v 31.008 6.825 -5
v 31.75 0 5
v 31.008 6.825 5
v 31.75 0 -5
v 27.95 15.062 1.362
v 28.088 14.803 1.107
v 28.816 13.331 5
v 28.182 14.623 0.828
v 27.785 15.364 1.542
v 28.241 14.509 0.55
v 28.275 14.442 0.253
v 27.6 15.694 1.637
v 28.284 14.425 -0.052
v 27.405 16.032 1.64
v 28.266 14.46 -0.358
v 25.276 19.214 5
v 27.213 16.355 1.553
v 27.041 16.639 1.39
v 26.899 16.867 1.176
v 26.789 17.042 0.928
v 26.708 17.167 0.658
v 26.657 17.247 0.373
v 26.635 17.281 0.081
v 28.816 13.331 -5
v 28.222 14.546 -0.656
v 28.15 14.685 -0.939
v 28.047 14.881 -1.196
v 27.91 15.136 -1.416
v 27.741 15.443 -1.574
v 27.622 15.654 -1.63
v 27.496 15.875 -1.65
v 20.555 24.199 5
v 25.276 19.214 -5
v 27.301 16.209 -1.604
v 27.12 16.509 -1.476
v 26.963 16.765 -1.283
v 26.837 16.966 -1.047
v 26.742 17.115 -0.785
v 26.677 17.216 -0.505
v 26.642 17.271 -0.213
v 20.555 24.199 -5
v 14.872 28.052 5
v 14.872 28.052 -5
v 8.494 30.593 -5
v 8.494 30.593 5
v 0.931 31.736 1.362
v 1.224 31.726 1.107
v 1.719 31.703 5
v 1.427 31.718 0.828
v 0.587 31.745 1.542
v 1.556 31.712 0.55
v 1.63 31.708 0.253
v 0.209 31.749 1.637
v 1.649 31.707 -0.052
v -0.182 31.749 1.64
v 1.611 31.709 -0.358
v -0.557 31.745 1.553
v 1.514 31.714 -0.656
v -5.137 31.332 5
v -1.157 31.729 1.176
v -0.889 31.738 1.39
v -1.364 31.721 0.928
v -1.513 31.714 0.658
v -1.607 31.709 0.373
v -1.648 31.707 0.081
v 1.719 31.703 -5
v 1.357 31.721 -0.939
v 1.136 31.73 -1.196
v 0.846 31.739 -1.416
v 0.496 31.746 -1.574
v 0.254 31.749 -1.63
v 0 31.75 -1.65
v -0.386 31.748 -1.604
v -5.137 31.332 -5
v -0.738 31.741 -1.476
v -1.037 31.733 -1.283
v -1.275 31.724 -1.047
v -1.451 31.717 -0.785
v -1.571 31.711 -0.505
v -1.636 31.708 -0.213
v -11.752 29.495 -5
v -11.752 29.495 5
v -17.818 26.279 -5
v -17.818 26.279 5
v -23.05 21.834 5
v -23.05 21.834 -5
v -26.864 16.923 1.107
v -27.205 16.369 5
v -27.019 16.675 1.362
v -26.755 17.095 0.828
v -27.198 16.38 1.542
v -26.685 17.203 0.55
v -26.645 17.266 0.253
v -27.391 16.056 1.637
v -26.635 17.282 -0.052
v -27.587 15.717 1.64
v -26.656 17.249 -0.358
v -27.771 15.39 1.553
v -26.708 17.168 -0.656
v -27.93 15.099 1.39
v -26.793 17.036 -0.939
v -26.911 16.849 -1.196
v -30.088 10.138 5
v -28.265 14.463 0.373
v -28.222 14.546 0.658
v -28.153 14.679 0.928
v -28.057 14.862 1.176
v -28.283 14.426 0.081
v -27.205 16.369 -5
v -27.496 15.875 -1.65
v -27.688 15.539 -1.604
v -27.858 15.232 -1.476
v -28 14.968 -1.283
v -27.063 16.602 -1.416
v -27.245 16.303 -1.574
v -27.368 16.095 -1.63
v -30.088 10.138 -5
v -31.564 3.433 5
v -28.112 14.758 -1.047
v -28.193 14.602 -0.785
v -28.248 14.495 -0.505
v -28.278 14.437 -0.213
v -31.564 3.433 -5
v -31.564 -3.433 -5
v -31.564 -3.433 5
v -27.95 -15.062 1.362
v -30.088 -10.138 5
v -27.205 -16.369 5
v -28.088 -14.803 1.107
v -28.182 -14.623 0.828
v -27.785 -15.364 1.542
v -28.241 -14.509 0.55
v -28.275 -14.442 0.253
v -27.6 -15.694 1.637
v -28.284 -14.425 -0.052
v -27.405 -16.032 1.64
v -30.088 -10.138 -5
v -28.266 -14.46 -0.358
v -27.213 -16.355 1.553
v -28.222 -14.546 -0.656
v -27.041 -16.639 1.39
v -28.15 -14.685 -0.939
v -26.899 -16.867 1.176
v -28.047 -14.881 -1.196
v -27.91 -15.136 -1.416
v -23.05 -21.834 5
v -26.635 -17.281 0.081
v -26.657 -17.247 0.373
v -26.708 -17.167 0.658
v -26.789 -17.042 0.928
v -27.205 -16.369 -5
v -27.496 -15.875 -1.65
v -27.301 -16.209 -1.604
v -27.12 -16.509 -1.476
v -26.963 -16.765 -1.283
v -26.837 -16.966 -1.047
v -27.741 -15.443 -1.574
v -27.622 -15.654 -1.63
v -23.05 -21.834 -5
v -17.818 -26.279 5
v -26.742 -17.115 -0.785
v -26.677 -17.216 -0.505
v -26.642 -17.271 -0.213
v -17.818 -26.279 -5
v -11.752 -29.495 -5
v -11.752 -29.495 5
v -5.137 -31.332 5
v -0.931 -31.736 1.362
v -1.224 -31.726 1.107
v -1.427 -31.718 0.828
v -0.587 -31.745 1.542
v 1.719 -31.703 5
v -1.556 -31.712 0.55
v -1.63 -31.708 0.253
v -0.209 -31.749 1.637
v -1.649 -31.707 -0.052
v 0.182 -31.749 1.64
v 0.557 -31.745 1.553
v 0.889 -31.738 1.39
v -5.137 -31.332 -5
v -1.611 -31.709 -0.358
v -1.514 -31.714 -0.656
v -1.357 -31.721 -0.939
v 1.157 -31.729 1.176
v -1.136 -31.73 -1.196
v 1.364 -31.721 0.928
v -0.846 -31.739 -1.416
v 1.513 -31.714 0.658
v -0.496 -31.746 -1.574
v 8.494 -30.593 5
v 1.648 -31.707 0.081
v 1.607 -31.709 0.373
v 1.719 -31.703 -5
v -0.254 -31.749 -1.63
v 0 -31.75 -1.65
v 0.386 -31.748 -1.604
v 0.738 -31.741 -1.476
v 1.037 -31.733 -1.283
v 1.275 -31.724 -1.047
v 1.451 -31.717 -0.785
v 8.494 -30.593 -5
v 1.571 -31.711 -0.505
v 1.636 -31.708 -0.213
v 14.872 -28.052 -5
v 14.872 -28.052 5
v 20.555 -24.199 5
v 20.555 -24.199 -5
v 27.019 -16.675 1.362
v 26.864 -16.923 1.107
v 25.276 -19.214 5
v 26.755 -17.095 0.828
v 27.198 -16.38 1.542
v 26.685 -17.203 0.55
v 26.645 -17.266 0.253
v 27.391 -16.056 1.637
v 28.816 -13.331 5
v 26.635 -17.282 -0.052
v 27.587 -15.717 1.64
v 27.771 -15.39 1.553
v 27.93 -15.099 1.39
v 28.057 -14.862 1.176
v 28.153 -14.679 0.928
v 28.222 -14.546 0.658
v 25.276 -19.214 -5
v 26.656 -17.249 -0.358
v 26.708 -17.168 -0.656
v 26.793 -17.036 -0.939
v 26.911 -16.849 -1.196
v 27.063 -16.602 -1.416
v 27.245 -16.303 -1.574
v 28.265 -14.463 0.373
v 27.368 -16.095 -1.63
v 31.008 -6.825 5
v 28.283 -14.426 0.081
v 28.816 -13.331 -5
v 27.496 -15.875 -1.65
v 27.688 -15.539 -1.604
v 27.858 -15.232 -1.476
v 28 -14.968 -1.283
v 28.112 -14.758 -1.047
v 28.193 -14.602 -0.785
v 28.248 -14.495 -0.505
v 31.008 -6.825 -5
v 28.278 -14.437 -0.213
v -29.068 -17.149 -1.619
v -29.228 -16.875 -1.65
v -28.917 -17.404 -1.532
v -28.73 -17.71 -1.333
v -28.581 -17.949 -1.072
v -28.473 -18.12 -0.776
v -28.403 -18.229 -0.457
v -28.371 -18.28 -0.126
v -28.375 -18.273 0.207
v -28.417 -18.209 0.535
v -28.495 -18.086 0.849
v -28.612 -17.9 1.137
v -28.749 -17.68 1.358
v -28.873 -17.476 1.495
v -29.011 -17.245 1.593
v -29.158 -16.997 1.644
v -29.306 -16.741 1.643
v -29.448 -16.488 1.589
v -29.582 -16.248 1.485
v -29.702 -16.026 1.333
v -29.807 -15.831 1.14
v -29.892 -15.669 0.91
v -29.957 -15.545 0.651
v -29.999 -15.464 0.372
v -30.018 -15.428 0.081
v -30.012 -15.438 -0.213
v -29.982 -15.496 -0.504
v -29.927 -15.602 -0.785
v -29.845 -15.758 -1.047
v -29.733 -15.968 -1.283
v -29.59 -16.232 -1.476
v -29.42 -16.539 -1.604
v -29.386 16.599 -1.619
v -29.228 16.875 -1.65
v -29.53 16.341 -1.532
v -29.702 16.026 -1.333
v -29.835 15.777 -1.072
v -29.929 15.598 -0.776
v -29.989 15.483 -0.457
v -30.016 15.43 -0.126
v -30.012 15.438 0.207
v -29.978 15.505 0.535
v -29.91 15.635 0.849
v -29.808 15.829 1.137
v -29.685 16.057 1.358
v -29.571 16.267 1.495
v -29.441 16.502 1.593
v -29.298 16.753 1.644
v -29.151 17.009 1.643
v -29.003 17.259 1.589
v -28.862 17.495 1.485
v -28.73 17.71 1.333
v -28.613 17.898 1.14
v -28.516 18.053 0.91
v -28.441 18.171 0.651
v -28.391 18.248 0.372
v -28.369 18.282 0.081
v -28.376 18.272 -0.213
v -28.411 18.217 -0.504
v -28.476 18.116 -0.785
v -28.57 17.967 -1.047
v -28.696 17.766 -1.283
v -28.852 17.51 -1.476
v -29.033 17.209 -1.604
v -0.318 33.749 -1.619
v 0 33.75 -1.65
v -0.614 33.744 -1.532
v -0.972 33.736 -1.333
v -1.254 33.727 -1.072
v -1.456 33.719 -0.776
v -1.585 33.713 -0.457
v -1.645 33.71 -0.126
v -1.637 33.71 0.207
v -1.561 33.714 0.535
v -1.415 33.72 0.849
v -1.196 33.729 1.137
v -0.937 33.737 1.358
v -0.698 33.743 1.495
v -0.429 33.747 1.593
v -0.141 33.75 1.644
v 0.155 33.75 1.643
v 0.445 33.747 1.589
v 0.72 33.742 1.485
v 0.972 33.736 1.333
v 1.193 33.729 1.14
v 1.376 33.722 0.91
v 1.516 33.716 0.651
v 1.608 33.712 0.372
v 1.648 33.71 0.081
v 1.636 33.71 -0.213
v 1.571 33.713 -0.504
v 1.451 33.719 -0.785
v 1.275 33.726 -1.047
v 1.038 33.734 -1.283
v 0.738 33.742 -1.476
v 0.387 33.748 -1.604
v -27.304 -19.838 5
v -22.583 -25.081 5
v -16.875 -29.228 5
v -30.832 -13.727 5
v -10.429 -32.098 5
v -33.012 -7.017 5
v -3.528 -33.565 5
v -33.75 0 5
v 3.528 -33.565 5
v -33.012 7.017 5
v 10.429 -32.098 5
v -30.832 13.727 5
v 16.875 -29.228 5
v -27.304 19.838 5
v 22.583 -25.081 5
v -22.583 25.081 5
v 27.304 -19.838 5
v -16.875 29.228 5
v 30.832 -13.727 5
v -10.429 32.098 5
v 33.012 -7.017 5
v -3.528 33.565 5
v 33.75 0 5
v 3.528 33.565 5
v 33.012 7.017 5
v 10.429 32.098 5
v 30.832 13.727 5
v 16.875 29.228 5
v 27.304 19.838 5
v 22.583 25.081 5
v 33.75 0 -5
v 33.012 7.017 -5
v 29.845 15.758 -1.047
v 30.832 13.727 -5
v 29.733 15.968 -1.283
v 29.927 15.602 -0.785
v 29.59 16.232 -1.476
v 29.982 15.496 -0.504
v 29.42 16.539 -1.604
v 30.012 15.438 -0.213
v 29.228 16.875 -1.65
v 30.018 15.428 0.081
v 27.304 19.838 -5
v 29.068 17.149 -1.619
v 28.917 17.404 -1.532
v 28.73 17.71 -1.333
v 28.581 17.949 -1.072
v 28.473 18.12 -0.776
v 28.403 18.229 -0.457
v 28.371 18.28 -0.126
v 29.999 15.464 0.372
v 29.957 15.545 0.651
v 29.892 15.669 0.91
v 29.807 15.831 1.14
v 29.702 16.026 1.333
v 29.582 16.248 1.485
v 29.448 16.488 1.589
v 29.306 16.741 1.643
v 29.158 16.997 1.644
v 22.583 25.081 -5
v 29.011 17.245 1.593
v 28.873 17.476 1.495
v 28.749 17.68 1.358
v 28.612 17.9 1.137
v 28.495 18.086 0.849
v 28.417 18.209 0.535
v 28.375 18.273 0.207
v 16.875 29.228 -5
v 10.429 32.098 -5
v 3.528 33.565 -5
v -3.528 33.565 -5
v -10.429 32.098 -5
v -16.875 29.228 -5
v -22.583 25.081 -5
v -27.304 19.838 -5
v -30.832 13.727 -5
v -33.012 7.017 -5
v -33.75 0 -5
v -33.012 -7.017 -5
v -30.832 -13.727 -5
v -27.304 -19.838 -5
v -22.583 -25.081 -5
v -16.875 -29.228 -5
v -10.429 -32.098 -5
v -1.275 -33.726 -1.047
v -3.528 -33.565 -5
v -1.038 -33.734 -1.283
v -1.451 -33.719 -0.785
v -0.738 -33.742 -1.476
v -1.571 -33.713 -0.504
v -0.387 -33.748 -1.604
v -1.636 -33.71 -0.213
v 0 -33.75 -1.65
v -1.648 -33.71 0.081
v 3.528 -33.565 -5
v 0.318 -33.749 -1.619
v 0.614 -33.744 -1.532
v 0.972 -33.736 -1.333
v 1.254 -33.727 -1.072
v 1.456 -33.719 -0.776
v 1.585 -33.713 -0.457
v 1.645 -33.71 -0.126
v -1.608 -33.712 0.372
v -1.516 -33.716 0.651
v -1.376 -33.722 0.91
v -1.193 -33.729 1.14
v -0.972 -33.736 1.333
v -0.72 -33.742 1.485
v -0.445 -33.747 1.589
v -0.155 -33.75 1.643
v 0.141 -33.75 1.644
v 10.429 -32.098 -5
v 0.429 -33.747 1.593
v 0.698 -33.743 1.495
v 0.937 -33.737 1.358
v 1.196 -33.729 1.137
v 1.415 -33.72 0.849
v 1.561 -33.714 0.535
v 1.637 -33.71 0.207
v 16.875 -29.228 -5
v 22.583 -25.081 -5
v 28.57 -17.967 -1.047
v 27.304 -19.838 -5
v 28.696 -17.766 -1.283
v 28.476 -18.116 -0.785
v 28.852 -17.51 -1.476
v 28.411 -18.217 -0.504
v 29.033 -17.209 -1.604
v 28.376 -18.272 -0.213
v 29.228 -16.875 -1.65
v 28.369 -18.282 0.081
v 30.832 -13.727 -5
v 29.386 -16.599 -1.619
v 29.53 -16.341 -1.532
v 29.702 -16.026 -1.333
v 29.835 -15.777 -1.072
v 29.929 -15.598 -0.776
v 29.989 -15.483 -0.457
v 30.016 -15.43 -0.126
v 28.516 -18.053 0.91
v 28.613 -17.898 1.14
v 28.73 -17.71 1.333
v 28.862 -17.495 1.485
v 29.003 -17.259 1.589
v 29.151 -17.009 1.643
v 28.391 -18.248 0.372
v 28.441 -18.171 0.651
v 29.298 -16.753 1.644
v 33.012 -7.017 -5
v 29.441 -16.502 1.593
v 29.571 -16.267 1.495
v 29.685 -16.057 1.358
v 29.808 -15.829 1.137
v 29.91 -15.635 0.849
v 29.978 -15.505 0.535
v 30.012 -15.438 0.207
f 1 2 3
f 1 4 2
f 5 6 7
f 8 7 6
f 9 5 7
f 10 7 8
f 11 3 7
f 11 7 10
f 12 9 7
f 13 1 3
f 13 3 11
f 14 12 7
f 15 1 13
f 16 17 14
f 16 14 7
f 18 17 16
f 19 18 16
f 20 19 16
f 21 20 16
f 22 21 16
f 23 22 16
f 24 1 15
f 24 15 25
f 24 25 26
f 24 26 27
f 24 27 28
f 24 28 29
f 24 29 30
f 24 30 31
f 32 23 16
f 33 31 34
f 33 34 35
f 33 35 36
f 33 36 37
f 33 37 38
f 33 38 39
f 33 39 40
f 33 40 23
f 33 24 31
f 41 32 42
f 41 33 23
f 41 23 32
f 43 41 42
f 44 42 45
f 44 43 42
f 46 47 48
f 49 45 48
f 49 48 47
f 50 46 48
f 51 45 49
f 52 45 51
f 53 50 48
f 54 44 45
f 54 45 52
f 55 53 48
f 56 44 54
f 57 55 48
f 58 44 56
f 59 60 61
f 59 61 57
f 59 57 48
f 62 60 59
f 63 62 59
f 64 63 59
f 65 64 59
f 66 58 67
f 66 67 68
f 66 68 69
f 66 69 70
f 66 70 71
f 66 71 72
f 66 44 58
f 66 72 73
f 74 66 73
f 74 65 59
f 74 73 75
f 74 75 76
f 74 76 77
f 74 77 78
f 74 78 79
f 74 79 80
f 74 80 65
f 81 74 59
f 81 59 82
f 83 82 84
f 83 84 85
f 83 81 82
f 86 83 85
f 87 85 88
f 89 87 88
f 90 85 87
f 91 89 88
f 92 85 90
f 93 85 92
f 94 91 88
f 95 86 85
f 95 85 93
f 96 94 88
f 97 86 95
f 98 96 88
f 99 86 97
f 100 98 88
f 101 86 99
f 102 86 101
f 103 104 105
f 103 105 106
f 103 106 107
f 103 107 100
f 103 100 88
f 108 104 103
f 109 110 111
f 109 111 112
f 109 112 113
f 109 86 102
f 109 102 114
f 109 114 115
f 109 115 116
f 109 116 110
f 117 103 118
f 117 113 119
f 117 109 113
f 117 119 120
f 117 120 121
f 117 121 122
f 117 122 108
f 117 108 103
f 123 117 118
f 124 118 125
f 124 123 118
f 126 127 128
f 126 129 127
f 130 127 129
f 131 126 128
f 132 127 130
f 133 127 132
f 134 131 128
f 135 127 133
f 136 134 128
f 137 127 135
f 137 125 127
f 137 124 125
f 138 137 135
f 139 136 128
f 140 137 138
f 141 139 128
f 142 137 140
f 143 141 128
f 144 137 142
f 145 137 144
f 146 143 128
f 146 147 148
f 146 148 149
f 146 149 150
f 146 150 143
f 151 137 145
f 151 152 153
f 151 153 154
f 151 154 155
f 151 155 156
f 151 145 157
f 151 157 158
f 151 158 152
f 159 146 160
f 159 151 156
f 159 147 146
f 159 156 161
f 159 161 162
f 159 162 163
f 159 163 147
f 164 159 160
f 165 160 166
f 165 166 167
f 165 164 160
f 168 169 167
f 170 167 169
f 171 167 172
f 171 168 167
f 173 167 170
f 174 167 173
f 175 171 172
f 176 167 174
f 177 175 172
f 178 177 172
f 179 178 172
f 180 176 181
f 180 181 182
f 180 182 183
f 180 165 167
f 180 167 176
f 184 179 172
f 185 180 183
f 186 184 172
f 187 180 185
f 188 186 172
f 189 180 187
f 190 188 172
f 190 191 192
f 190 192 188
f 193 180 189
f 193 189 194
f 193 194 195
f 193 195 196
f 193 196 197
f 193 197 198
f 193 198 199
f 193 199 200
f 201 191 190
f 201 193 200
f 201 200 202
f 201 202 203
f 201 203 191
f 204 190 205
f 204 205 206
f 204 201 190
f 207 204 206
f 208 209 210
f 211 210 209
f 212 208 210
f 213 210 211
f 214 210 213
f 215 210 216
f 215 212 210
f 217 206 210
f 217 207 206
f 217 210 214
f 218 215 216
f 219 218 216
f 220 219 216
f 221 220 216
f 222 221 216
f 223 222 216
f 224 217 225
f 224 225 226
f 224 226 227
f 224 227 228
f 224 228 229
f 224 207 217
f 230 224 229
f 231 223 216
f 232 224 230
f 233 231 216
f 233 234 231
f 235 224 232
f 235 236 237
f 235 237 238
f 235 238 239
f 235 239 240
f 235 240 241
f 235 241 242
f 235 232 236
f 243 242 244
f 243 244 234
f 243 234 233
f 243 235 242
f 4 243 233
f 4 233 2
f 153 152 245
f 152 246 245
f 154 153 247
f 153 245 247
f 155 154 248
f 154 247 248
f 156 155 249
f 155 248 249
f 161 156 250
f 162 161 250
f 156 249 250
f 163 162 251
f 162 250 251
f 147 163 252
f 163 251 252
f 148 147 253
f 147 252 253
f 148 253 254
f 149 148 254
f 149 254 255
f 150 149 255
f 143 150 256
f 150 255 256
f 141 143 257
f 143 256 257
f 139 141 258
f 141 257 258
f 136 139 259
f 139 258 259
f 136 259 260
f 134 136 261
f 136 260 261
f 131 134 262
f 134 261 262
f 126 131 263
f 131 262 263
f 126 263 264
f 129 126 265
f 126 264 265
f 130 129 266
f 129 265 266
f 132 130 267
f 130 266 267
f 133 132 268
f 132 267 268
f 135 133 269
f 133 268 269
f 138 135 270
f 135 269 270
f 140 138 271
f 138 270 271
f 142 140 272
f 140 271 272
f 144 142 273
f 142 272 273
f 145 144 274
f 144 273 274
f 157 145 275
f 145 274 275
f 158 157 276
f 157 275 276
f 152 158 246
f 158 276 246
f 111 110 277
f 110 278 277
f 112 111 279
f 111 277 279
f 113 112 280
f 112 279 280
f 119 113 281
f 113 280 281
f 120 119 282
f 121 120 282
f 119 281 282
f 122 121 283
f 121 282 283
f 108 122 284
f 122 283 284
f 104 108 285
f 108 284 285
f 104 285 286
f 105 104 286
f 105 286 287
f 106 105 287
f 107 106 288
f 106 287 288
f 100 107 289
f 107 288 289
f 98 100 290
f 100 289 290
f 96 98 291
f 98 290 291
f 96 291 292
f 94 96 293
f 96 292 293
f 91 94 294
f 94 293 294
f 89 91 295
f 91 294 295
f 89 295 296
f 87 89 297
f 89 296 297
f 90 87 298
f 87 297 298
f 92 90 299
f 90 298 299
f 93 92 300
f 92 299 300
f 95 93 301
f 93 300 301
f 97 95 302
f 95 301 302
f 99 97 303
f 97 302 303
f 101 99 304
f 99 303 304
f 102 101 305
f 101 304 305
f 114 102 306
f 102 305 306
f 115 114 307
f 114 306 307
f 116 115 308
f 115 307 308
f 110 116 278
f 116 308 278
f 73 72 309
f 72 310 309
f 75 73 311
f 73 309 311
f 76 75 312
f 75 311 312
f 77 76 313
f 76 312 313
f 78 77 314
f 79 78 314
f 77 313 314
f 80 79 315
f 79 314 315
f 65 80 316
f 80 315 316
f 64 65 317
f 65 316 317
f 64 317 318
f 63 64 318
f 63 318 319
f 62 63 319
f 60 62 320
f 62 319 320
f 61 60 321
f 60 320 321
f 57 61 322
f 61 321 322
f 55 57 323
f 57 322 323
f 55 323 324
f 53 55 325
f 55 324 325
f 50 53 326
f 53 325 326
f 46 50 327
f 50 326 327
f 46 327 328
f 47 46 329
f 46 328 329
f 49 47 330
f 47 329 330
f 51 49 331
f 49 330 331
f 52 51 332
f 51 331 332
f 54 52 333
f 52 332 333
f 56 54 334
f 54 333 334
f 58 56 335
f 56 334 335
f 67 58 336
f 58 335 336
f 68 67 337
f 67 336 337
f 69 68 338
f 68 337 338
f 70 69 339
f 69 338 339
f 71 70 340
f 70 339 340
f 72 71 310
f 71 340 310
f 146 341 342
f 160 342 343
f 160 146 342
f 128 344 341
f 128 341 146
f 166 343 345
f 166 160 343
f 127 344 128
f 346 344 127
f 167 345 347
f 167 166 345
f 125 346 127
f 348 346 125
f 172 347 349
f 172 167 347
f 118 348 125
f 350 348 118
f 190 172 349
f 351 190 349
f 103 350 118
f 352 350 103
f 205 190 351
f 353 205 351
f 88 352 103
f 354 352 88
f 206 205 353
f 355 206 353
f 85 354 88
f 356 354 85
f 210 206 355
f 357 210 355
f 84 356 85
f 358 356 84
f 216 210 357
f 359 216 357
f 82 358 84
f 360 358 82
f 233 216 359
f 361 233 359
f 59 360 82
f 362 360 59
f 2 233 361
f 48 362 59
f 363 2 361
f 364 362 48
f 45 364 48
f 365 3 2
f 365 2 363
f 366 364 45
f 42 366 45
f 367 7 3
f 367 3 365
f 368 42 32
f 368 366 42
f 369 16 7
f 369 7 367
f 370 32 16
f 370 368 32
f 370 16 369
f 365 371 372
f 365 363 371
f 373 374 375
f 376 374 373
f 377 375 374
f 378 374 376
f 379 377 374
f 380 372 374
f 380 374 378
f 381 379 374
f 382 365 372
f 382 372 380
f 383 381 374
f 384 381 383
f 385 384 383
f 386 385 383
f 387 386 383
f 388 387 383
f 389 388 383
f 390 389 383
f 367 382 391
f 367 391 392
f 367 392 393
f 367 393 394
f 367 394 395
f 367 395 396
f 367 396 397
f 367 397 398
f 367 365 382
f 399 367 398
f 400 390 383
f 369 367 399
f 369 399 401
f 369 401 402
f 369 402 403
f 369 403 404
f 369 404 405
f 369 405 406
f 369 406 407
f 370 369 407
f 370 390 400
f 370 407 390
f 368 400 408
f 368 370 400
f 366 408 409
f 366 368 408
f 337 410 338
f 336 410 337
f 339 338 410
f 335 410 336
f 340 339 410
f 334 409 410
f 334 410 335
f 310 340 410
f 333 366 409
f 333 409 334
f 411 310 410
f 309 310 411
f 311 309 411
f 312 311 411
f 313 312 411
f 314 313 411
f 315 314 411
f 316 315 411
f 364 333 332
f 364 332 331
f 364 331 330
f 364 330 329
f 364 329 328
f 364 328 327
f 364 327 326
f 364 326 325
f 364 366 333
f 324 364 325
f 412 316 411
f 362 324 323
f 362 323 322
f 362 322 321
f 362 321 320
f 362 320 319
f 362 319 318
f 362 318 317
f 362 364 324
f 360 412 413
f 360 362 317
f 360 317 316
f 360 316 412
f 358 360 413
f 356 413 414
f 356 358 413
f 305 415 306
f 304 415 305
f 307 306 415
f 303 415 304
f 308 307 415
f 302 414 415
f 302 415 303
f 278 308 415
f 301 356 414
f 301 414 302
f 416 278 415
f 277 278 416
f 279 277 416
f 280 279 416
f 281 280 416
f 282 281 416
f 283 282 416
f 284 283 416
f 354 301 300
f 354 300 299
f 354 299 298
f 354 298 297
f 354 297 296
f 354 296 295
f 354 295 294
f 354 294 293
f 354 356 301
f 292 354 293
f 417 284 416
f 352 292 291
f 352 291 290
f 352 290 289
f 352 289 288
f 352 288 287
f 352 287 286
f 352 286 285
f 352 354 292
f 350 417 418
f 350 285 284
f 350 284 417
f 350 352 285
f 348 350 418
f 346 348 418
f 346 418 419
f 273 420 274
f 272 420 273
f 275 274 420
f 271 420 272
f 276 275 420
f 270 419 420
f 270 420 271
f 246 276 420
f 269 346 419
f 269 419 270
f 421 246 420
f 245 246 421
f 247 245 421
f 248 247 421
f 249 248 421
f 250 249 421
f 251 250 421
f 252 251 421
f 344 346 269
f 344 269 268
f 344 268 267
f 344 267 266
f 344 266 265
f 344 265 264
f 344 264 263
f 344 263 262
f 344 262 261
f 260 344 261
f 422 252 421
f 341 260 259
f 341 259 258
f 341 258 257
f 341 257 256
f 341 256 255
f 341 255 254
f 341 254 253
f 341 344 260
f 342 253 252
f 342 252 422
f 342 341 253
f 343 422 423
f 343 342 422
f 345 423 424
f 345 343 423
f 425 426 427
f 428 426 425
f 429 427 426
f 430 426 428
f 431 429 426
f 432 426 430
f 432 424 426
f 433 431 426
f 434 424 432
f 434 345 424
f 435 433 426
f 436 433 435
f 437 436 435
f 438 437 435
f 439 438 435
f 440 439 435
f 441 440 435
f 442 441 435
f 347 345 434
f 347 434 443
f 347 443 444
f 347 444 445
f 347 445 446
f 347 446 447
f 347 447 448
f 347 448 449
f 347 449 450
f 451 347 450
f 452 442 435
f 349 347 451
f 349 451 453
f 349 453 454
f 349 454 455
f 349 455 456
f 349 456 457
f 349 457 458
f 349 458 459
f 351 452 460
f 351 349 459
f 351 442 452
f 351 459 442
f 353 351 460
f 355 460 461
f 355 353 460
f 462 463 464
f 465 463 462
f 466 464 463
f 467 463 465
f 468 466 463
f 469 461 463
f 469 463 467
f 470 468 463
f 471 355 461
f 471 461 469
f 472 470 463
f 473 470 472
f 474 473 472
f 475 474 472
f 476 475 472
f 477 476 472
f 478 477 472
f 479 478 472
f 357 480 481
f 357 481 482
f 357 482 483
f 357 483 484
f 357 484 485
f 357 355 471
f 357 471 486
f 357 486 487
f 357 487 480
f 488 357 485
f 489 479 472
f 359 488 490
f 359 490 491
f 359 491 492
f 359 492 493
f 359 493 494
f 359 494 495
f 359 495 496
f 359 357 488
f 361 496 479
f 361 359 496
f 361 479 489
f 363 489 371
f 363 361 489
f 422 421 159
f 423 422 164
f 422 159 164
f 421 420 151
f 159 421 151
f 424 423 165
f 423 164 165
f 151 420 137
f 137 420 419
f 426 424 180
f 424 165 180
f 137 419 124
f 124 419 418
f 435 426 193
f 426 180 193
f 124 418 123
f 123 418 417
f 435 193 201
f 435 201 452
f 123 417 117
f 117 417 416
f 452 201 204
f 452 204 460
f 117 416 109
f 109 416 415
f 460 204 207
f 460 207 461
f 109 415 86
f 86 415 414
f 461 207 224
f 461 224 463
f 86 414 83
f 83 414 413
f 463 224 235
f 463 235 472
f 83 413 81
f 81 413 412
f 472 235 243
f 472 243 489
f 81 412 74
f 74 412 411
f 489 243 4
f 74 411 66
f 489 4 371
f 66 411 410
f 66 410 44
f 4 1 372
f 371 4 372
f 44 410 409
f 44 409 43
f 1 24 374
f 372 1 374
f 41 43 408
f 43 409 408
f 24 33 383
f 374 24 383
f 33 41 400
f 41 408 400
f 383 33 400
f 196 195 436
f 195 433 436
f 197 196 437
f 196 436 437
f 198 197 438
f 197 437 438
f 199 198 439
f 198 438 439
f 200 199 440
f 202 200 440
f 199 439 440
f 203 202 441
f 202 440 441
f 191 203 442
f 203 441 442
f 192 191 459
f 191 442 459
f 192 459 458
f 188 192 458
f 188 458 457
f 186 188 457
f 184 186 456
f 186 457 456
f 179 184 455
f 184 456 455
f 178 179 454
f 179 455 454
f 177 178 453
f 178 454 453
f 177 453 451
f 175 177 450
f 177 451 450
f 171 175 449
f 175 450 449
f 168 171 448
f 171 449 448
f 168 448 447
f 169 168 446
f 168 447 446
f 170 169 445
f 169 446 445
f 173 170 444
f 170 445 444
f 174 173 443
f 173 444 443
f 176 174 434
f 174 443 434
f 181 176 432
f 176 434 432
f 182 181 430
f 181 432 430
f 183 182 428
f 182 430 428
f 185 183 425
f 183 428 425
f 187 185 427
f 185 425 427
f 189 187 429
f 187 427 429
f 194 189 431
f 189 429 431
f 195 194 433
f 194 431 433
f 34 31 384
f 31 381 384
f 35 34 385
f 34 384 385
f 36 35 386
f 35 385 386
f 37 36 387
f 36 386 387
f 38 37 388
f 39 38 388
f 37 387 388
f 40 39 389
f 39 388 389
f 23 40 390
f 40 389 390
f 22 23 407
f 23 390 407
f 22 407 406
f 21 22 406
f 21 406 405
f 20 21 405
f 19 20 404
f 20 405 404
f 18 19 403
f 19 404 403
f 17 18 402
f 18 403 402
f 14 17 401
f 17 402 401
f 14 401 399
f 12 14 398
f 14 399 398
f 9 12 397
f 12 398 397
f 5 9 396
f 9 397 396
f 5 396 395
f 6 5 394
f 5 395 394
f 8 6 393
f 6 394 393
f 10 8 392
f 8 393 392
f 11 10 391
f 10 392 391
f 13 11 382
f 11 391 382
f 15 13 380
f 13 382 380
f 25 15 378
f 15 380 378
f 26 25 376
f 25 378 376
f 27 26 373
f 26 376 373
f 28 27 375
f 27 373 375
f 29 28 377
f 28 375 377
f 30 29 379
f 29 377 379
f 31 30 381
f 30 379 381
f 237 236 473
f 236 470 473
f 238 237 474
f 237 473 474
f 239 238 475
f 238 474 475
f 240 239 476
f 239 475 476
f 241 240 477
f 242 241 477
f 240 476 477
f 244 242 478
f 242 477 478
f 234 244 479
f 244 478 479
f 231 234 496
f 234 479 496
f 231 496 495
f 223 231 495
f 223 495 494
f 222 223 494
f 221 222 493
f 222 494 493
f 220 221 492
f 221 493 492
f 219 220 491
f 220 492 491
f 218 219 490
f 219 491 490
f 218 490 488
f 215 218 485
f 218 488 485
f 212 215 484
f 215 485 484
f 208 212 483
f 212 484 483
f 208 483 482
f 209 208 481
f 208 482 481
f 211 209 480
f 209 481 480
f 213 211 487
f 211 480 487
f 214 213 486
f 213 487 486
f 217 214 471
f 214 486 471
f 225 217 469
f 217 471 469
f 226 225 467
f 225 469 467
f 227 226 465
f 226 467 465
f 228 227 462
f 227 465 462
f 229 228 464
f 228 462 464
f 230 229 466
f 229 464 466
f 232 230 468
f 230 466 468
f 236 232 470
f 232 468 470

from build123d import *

# Parameters (mm, degrees)
SKETCH1_R           = 33.75
SKETCH1_R_2         = 31.75
BOSS_EXTRUDE1_DEPTH = 5
SKETCH3_W           = 1.65
SKETCH3_H           = 33.75
CIRPATTERN1_COUNT   = 6


with BuildPart() as part:
    # Sketch1 → Boss-Extrude1 (new, symmetric)
    with BuildSketch(Plane.XY):
        Circle(SKETCH1_R)
        Circle(SKETCH1_R_2, mode=Mode.SUBTRACT)
    extrude(amount=BOSS_EXTRUDE1_DEPTH, both=True)

    # Sketch3 → M4x0.7 Tapped Hole1 (revolve, cut)
    with BuildSketch(Plane(origin=(0, 0, 0), x_dir=(0, 0, -1), z_dir=(1, 0, 0))):
        with Locations((0.825, 16.875)):
            Rectangle(SKETCH3_W, SKETCH3_H)
    m4x0_7_tapped_hole1 = revolve(axis=Axis((0, -6.35, 0), (0, 1, 0)), mode=Mode.SUBTRACT)

    # CirPattern1: M4x0.7 Tapped Hole1 ×6 about axis
    cirpattern1_axis = Axis((0, 0, 5), (0, 0, -1))
    for i in range(1, CIRPATTERN1_COUNT):
        add(m4x0_7_tapped_hole1.rotate(cirpattern1_axis, i * 360 / CIRPATTERN1_COUNT), mode=Mode.SUBTRACT)


solid = part.part
